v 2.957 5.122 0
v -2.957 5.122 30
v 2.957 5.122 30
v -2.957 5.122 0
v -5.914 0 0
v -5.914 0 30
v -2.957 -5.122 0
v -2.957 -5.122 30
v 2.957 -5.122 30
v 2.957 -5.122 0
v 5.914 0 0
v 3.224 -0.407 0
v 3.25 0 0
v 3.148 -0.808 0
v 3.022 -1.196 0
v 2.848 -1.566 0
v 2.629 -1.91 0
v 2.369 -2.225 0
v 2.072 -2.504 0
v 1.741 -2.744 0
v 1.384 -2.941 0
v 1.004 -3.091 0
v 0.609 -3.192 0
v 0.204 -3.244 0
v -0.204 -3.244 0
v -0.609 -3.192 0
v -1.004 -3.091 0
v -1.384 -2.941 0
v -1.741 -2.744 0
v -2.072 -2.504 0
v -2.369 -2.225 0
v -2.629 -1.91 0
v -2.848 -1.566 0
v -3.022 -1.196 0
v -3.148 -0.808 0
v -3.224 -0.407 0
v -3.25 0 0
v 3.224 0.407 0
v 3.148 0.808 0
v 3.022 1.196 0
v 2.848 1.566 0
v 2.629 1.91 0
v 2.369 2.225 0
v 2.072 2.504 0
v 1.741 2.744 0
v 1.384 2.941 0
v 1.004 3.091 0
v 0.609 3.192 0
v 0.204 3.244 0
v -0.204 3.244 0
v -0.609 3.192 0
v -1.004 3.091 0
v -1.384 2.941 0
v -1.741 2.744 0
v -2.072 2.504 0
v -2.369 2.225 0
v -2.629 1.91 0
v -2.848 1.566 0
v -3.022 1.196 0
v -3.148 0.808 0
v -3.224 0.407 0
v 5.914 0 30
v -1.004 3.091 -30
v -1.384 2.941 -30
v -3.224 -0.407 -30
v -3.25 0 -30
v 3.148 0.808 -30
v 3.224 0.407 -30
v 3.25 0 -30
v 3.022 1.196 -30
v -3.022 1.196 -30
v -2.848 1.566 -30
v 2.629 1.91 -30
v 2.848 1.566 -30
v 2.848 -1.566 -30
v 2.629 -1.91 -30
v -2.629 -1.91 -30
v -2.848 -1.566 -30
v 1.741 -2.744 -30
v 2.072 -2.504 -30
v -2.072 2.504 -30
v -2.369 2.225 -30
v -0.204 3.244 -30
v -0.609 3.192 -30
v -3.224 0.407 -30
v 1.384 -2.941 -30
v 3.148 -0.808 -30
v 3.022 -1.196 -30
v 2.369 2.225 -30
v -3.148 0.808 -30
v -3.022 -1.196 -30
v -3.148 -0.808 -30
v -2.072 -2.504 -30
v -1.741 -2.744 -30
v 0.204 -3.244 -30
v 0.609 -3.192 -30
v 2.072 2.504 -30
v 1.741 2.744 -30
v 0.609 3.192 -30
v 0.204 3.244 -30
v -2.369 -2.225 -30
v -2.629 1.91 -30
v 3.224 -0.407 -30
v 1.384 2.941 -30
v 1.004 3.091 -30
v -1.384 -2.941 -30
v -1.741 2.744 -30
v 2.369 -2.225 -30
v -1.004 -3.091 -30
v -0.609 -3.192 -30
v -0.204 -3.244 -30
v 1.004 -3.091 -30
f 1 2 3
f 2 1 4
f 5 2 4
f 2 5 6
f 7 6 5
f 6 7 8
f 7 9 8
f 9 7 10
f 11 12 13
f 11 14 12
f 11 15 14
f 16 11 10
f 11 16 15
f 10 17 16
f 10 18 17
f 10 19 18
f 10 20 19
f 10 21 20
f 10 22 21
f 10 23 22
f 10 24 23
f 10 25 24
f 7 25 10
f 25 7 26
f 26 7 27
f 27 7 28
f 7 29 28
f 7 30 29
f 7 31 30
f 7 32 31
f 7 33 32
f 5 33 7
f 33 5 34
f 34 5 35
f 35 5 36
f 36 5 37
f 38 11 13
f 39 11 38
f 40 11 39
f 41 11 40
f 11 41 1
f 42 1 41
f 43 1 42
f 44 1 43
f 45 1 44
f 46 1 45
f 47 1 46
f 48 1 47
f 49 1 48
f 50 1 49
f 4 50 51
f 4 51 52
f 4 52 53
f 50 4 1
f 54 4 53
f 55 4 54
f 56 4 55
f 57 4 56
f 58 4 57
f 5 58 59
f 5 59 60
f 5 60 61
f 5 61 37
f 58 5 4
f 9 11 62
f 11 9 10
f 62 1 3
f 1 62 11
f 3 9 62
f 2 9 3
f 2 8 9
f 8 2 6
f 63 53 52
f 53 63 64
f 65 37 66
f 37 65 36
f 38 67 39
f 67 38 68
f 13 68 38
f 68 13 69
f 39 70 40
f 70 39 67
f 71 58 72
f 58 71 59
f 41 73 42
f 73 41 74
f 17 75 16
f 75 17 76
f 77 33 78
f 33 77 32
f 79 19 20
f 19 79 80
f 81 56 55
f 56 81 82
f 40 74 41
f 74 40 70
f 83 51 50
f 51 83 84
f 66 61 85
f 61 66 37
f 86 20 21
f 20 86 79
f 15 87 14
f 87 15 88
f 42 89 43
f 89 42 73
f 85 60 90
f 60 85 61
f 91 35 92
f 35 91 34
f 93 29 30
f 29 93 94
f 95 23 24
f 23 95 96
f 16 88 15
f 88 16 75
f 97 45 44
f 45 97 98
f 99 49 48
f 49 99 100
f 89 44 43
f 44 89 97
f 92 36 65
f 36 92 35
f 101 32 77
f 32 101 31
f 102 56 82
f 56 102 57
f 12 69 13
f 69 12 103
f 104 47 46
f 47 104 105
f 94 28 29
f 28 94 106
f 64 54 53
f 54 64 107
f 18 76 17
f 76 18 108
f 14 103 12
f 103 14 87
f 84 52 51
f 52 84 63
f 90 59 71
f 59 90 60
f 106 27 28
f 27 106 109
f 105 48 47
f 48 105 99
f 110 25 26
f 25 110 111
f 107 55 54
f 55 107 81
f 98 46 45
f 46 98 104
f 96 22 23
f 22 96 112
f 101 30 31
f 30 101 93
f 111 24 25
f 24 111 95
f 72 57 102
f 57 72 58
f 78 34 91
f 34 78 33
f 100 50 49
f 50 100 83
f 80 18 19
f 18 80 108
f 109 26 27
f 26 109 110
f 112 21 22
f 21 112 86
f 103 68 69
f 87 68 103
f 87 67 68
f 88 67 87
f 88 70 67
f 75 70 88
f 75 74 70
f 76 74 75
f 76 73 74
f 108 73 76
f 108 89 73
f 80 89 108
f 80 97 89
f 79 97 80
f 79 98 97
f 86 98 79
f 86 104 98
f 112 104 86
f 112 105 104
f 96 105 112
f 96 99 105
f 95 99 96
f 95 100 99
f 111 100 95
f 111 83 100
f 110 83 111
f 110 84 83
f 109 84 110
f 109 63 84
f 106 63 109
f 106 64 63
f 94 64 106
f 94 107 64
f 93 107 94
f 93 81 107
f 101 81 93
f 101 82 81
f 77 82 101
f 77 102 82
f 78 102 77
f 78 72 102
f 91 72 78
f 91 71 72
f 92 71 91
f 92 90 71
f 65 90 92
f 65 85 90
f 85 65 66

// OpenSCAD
$fn = 50;


difference() {
	union() {
		linear_extrude(height = 30) {
			polygon(points = [[5.9142500000, 0.0000000000], [2.9571250000, 5.1218907443], [-2.9571250000, 5.1218907443], [-5.9142500000, 0.0000000000], [-2.9571250000, -5.1218907443], [2.9571250000, -5.1218907443]]);
		}
		translate(v = [0, 0, -30]) {
			cylinder(h = 30, r = 3.2500000000);
		}
	}
	union();
}
